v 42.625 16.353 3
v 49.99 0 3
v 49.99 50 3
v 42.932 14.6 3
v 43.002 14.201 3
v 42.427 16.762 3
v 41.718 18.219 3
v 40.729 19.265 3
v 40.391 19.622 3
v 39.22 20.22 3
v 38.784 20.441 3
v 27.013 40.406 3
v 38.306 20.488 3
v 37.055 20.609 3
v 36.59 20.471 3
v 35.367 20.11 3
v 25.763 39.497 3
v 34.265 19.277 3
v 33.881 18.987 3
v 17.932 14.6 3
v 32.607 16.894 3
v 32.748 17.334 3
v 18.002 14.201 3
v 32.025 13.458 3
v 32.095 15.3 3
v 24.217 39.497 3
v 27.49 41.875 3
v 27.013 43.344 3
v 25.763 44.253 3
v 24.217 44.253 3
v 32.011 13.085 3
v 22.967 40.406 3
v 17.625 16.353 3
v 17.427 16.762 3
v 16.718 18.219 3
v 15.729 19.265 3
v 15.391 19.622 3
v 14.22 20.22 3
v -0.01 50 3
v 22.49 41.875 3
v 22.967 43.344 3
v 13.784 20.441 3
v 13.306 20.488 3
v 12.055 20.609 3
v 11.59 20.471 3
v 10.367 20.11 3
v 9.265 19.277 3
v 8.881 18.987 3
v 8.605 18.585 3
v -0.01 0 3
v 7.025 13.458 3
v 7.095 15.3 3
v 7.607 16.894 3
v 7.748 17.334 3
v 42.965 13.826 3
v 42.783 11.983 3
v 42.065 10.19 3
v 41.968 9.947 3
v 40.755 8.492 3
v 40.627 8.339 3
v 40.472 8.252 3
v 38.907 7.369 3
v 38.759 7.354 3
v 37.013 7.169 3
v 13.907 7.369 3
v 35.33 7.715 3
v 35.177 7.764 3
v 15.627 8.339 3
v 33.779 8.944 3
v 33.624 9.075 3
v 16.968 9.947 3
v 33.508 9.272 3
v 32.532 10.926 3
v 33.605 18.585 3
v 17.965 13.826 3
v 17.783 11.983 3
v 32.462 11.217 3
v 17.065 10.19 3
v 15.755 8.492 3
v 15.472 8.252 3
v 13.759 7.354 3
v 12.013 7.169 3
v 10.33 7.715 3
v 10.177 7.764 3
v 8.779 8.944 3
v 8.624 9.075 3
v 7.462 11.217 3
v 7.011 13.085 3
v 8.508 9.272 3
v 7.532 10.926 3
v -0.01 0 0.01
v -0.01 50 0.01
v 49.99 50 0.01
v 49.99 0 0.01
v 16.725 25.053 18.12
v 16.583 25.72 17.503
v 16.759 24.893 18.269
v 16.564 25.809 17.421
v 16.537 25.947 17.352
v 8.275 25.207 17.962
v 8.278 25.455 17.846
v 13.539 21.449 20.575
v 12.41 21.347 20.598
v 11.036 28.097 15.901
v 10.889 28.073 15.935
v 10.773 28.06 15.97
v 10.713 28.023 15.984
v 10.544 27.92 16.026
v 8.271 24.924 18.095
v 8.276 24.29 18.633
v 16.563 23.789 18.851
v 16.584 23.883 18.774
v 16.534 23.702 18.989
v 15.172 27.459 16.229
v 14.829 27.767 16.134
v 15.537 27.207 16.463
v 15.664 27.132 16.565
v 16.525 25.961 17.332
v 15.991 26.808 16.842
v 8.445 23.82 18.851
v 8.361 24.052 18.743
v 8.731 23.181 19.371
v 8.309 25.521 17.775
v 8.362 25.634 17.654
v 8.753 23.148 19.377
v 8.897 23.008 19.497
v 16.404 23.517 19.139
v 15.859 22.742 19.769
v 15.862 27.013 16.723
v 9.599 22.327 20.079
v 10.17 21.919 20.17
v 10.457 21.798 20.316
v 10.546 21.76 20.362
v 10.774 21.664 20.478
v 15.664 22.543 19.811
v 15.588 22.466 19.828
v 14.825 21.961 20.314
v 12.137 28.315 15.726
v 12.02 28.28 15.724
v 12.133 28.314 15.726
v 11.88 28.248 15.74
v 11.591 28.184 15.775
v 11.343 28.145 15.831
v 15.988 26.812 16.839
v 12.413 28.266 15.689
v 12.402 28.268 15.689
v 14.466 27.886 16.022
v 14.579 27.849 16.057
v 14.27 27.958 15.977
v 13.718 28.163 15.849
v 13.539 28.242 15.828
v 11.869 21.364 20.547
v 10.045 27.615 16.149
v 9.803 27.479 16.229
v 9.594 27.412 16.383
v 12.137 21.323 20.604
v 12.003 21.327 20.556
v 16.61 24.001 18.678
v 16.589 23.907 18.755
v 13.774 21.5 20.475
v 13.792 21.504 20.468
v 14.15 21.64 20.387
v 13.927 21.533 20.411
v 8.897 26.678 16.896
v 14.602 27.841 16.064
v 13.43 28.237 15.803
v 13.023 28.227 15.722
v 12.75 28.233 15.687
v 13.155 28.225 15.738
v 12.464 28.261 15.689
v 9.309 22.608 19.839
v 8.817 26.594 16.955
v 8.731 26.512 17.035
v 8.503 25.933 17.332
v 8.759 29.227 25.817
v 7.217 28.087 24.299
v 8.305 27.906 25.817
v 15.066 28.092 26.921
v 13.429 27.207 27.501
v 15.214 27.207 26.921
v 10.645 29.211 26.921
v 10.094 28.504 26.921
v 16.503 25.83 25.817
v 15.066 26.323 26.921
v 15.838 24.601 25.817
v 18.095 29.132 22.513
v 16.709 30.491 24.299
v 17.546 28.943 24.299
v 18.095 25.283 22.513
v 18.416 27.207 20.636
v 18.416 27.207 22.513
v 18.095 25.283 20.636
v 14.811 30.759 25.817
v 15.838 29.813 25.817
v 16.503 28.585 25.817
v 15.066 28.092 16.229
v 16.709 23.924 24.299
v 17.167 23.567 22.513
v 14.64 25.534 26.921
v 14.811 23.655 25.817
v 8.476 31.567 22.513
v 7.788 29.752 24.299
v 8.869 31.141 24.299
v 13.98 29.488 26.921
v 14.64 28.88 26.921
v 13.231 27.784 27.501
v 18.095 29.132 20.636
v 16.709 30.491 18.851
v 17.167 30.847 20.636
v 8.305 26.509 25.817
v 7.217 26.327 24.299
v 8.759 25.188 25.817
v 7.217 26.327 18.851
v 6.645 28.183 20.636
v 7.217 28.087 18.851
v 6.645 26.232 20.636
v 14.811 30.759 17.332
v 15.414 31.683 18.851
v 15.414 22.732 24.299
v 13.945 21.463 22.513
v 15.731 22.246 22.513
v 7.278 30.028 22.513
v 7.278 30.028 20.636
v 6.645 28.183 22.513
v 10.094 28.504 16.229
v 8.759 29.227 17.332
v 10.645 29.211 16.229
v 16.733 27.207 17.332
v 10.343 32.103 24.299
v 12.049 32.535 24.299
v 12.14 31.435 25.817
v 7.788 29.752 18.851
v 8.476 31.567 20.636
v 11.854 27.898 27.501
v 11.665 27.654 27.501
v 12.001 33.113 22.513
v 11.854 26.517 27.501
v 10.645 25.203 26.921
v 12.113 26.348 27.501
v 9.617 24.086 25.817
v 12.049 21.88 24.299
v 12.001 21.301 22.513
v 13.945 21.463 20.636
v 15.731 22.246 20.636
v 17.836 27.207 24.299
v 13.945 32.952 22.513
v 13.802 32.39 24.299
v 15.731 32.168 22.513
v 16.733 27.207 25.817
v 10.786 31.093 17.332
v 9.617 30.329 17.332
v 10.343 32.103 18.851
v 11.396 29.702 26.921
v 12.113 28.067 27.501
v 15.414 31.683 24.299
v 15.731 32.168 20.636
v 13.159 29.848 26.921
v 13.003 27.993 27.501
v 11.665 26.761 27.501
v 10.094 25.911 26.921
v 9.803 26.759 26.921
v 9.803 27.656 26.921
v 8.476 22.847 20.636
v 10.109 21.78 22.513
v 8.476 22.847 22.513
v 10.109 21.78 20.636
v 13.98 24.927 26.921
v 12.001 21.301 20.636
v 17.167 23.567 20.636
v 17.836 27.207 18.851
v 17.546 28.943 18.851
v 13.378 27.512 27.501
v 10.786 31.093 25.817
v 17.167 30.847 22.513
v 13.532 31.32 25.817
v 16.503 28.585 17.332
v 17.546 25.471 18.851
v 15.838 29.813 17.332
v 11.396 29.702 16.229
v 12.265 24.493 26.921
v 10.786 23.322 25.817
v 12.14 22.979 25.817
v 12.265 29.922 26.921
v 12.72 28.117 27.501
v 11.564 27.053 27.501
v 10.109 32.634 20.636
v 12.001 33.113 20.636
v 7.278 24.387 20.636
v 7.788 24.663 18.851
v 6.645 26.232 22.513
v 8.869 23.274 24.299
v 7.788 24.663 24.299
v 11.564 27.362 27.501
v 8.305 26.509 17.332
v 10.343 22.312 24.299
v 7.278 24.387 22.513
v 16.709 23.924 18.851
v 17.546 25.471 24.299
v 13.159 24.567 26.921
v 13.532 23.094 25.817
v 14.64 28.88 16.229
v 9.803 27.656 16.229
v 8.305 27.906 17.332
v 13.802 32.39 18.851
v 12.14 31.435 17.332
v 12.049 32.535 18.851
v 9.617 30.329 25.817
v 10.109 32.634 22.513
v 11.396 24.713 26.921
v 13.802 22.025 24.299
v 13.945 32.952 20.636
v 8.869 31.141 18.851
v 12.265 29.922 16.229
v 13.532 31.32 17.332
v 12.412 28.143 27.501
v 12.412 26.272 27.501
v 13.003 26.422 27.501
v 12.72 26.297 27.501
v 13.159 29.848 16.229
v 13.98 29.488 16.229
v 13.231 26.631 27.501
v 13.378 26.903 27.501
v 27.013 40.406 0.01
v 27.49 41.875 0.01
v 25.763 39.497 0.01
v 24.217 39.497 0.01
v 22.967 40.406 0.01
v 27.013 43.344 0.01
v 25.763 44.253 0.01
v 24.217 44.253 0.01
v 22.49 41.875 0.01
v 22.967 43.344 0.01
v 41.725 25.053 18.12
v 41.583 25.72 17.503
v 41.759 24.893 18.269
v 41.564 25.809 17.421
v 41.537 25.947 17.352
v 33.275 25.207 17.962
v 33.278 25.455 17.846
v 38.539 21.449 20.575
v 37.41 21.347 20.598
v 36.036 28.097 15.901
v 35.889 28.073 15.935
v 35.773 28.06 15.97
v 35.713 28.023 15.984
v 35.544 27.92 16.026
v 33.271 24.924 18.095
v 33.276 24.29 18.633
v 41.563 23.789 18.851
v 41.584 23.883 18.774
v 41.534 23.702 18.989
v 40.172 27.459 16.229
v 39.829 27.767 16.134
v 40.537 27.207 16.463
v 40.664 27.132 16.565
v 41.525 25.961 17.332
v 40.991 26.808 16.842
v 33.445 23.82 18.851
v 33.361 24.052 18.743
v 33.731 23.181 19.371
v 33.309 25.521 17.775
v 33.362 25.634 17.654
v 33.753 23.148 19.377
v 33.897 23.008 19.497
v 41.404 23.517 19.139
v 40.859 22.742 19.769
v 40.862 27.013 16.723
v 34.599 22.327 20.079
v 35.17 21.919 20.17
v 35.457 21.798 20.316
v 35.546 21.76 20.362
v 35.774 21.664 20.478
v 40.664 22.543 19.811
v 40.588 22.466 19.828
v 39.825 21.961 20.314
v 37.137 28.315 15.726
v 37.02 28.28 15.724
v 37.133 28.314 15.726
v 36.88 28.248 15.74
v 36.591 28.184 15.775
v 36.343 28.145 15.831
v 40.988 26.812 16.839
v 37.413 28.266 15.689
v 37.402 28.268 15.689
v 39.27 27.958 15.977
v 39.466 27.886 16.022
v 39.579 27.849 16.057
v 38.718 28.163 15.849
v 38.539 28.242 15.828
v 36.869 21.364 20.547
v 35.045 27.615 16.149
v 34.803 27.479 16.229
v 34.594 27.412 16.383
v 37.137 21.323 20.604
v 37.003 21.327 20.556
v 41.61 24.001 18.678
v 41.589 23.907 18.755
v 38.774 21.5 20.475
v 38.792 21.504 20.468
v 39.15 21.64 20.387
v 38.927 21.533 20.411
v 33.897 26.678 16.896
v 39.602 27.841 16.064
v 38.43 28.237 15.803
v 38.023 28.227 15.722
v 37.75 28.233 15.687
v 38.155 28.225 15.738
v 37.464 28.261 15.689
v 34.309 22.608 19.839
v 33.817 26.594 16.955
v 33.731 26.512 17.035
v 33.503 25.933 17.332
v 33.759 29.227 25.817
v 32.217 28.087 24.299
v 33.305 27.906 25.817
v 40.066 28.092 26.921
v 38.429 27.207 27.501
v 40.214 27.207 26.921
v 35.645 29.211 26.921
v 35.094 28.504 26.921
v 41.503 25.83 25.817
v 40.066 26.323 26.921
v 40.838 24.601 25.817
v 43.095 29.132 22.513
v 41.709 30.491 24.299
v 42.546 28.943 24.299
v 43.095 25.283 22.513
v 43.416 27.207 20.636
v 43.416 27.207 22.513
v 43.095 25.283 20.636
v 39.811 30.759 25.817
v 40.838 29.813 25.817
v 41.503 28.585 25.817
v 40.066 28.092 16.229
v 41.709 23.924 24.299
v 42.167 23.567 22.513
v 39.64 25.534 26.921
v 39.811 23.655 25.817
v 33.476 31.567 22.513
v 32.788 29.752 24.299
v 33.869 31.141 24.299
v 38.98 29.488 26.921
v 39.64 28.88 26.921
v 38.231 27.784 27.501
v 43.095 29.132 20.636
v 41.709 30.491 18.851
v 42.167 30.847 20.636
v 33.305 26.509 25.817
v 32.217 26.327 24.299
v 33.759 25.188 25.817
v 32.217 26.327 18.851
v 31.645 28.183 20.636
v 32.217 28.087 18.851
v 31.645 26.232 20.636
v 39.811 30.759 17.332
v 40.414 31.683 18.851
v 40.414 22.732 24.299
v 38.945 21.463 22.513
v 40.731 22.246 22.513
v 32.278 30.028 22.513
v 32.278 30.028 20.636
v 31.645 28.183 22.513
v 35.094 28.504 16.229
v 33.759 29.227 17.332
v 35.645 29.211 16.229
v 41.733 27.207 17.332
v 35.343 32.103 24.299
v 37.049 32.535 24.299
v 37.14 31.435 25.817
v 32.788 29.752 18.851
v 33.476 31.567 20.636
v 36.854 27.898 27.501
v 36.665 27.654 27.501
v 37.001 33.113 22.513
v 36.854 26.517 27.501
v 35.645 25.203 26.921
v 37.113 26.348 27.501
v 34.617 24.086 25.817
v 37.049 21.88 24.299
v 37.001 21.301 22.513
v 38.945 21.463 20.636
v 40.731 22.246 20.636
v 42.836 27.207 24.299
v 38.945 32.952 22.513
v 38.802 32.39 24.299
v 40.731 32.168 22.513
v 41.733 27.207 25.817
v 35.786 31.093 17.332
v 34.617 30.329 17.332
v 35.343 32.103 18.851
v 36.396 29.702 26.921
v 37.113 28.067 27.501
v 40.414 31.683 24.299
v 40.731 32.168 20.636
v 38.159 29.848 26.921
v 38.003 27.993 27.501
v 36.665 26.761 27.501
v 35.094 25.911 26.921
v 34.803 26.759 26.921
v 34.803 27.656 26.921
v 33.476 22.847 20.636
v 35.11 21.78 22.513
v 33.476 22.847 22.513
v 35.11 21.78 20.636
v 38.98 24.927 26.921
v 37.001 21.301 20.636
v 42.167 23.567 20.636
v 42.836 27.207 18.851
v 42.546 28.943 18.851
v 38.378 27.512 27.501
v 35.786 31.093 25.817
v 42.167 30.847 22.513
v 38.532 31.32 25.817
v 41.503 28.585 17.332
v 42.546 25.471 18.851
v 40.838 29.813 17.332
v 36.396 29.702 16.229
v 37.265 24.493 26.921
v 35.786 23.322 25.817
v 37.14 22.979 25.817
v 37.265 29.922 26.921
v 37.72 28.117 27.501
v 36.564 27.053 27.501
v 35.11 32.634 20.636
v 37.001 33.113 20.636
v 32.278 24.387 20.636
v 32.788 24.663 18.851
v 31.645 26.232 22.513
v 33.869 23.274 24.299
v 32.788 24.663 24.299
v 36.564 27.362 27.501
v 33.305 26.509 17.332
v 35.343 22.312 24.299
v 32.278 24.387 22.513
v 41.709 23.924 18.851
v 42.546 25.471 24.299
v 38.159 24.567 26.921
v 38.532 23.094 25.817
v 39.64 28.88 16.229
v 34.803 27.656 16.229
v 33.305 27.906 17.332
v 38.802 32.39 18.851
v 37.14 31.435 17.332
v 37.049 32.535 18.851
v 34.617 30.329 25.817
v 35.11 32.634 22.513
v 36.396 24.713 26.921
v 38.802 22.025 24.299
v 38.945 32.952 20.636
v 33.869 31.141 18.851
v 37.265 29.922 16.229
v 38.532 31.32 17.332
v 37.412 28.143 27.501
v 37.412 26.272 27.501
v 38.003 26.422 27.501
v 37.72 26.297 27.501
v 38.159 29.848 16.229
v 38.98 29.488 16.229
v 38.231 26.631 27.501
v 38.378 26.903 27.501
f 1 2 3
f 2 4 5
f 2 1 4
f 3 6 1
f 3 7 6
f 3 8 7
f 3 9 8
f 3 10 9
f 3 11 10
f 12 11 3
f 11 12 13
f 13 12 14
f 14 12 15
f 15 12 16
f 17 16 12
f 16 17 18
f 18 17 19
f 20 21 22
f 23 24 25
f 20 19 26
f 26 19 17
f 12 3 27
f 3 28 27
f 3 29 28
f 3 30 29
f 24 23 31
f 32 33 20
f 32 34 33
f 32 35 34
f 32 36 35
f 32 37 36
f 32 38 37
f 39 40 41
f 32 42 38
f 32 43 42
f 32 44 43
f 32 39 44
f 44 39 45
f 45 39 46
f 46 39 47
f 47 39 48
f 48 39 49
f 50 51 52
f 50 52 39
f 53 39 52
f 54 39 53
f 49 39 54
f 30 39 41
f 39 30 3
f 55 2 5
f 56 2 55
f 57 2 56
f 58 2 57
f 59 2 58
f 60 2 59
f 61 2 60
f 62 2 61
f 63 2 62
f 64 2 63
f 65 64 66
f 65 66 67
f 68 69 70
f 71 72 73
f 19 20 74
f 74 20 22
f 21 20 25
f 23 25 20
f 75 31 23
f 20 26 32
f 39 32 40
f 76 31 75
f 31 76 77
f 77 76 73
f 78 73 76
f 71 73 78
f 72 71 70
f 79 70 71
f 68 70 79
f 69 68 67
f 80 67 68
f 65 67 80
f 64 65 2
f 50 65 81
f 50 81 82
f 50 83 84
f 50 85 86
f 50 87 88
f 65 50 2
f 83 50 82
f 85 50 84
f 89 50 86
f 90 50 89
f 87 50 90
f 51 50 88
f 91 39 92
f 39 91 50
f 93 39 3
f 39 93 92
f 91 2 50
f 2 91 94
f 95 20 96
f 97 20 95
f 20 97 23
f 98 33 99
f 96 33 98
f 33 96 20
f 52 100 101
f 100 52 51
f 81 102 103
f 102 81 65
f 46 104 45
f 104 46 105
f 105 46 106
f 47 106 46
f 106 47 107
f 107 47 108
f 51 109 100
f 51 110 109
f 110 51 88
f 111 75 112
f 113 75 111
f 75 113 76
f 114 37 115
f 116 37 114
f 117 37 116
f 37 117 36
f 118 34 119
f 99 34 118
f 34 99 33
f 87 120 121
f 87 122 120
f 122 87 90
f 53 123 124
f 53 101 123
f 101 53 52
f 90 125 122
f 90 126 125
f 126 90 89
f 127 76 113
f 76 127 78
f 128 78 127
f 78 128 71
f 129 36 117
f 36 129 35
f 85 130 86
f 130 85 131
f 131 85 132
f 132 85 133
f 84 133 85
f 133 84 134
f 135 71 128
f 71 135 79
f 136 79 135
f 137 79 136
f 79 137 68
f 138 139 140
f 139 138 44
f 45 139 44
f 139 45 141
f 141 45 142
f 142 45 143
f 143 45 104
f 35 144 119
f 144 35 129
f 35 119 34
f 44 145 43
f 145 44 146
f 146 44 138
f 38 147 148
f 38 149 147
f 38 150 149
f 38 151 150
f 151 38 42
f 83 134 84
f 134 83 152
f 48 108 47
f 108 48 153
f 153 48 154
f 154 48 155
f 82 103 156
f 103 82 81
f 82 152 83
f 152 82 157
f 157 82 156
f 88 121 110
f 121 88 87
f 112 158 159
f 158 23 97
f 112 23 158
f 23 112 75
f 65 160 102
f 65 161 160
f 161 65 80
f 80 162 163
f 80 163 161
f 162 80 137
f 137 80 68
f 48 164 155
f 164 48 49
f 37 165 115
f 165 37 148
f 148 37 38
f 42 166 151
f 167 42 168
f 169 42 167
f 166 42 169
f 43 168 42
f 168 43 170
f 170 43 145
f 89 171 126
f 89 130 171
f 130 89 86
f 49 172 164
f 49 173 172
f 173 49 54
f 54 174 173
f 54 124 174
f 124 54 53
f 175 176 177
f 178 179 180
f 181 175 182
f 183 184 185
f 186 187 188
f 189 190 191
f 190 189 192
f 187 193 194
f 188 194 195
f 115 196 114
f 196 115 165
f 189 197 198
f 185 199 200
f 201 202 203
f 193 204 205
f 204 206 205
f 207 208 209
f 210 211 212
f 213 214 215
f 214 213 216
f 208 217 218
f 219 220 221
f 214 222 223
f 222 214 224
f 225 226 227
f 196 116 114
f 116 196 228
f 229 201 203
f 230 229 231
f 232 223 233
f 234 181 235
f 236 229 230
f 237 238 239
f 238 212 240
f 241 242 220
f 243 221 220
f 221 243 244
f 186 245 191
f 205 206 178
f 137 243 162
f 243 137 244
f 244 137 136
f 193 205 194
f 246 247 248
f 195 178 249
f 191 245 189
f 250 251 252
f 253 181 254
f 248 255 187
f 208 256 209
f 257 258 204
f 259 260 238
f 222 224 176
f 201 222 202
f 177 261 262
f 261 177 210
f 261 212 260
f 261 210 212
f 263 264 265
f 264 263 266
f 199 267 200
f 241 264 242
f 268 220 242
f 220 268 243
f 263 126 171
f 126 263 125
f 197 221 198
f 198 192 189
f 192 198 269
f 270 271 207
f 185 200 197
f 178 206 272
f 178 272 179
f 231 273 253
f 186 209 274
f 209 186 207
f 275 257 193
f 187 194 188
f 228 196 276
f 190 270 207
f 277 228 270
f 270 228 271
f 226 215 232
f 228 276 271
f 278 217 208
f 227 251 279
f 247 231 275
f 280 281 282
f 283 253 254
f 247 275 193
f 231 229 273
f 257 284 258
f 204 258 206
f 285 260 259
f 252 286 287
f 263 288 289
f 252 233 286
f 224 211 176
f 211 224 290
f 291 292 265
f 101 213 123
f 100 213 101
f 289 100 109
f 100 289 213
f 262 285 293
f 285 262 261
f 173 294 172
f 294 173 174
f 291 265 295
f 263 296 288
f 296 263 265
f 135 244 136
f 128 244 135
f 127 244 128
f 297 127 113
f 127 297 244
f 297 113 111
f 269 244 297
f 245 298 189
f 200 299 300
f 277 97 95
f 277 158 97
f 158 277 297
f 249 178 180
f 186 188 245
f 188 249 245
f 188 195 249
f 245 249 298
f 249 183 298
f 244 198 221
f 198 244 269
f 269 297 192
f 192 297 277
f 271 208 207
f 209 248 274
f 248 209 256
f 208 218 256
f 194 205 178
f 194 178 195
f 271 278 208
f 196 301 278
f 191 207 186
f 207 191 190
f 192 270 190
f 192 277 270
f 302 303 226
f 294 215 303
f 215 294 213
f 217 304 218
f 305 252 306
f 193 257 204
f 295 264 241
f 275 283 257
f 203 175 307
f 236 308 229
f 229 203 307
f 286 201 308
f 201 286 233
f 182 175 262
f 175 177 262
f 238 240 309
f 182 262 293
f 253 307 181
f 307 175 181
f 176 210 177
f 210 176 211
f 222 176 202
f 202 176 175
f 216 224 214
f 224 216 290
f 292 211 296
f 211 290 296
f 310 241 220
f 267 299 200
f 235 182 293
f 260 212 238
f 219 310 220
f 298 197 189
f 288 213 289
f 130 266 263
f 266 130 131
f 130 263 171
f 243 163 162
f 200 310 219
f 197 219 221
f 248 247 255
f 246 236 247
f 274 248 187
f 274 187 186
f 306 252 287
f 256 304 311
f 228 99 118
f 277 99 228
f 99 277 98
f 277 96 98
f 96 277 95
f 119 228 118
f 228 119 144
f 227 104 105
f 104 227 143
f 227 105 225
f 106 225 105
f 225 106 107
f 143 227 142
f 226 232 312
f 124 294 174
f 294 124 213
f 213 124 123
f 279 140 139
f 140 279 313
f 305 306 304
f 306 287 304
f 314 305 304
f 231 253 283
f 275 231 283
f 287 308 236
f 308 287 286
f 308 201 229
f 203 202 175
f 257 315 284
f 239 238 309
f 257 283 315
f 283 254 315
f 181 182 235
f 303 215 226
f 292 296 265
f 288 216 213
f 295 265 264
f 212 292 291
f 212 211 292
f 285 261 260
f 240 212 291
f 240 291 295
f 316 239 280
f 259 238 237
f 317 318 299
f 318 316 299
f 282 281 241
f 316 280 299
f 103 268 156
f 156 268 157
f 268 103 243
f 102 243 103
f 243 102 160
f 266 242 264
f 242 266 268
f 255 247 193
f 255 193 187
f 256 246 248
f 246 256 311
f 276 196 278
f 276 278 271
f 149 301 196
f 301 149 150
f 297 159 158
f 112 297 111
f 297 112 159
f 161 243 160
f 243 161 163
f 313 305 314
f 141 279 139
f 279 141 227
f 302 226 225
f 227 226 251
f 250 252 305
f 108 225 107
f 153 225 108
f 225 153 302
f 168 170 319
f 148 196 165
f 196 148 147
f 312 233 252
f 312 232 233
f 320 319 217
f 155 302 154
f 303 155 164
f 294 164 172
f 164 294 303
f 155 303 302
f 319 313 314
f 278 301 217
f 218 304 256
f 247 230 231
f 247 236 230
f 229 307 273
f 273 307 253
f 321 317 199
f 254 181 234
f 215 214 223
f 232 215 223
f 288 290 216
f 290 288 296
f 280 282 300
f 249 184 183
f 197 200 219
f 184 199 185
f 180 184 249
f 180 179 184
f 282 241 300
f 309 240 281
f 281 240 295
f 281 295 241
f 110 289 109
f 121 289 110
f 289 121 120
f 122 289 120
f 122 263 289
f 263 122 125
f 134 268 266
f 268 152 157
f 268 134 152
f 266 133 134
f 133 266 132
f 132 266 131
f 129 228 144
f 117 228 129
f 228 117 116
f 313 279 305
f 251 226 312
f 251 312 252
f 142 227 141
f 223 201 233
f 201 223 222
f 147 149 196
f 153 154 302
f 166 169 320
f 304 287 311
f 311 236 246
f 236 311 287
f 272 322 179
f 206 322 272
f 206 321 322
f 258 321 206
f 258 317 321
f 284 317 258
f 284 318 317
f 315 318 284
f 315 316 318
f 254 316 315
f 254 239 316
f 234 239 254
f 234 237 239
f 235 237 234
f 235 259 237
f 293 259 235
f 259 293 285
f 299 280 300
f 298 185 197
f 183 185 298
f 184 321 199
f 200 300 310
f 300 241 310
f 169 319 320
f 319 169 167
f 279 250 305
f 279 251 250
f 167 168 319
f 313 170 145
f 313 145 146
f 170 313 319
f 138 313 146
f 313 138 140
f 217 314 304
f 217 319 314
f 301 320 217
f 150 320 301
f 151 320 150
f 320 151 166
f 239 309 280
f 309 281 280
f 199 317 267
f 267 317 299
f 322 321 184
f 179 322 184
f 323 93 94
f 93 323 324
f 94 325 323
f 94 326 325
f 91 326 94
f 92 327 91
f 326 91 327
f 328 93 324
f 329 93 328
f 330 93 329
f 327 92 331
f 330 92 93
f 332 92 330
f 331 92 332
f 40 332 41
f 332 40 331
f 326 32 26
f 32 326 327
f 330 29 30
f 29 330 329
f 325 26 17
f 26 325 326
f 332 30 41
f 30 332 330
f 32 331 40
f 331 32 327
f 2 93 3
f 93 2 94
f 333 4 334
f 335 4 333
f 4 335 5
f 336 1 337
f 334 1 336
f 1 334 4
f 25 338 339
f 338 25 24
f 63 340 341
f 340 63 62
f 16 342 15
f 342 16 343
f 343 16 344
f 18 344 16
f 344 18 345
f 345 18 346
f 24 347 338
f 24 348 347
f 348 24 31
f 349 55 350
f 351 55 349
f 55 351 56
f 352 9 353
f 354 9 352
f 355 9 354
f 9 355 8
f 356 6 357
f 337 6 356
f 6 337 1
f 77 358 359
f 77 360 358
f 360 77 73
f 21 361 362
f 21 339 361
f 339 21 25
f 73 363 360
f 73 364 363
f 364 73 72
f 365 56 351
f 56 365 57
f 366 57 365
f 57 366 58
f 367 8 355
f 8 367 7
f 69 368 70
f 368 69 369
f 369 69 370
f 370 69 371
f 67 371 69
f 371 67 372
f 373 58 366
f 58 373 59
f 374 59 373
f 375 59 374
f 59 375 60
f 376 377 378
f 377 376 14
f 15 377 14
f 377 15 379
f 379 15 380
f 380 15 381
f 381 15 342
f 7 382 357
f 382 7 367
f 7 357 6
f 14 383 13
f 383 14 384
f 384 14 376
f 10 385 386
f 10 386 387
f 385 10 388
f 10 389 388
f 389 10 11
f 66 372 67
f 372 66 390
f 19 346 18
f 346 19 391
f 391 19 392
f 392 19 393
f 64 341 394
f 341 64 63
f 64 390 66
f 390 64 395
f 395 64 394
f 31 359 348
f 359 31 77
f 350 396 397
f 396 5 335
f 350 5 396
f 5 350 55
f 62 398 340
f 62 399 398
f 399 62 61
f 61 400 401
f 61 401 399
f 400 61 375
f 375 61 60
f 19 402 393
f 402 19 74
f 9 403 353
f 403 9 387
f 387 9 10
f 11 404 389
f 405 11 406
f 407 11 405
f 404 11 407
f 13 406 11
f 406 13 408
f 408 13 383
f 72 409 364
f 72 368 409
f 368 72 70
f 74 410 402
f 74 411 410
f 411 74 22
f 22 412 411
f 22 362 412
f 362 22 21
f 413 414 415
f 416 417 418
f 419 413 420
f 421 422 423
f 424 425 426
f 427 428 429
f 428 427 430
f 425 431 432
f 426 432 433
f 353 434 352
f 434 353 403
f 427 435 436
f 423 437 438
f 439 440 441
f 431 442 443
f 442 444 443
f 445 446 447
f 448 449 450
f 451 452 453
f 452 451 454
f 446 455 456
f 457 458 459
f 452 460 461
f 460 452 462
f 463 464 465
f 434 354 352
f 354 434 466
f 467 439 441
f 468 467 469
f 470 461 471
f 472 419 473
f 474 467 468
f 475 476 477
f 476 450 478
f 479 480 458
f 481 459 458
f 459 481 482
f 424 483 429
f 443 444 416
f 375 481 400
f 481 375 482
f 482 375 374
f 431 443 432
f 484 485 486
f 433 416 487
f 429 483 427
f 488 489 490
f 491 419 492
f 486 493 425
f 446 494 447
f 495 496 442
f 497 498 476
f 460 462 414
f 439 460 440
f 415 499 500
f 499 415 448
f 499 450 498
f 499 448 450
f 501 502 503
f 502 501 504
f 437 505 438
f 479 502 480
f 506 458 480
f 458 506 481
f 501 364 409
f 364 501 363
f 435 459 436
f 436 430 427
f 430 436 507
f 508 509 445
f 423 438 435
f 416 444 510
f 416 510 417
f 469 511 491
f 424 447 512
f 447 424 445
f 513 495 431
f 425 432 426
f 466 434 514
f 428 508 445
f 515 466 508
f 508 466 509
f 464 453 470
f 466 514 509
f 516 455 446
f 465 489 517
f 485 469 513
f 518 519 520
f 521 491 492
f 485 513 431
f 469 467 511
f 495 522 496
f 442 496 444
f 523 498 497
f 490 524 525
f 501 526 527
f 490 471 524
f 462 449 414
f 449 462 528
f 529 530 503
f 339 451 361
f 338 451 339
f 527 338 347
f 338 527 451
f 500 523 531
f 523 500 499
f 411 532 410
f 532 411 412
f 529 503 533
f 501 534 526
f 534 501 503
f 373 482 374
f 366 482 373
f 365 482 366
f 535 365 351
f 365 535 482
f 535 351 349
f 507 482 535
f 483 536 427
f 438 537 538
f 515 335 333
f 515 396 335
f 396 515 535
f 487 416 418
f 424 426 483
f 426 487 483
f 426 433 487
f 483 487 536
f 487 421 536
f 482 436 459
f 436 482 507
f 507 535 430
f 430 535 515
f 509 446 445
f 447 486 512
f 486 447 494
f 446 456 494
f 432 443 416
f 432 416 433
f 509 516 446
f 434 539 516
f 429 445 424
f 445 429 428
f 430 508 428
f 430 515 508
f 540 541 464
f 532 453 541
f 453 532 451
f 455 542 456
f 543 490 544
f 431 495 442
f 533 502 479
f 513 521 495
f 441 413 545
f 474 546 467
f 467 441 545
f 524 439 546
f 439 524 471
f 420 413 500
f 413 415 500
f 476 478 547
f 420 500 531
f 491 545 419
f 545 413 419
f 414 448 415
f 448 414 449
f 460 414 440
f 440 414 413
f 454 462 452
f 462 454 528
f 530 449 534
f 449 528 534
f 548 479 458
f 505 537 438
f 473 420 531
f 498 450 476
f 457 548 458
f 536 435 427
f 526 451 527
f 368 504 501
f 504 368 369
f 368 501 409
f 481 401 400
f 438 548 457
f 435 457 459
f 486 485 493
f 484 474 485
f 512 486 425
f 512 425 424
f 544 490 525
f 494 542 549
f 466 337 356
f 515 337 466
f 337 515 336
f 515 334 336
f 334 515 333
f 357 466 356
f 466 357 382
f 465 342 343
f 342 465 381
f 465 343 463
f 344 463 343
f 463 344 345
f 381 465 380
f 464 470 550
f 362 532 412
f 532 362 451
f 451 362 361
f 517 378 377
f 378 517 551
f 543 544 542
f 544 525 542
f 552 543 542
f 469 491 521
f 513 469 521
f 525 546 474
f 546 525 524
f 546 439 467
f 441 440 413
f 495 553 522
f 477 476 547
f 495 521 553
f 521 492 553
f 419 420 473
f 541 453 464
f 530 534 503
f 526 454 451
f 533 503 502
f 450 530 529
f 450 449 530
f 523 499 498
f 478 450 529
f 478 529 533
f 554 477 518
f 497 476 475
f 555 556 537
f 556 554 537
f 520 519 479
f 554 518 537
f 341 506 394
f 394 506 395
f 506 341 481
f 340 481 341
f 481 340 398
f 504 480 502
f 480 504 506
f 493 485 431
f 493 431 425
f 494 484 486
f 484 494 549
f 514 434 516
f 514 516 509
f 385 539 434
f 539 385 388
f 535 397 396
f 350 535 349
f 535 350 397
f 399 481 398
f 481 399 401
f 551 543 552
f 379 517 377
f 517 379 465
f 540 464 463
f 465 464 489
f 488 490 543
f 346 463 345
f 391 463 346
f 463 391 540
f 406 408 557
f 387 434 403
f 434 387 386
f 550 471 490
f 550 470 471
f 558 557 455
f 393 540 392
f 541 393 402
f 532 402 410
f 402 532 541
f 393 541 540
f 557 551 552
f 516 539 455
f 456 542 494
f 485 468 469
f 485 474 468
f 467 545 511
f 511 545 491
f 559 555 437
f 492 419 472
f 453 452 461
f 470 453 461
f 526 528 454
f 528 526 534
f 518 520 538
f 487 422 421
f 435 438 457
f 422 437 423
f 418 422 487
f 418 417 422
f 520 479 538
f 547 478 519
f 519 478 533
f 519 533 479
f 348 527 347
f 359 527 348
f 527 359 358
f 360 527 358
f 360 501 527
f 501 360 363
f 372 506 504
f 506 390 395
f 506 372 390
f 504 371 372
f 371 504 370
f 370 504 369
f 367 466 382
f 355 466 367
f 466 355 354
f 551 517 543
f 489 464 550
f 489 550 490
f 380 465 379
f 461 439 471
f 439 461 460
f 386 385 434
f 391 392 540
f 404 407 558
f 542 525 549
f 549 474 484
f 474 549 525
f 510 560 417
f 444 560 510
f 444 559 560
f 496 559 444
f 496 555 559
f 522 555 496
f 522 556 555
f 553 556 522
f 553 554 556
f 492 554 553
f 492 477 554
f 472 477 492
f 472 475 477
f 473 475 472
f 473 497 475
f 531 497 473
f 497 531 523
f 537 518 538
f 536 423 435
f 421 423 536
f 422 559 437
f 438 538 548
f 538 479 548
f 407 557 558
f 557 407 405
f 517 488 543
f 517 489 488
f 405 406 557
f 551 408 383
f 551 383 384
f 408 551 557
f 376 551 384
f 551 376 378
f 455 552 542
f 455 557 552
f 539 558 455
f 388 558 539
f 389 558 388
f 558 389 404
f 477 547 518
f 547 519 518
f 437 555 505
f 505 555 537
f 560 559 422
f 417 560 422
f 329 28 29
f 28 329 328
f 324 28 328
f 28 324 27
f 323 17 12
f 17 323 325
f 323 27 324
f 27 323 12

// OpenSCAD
/*-------------------------------*\
|  YACH Yet Another Coat Hanger   |
| Parametrized for the Customizer |
| Creative Commons-Share alike    |
|  User Msquare on Thingverse     |
\*-------------------------------*/

// Based on my first simple "Yet Another Coat Hanger" Thing:593330

// Number of hooks
NOH = 2; //[1:7]

// Base Plate Height
BPH = 50 ; //[20:100]

// Base Plate Width
BPW = 25 ; //[20:60]

// Base Plate Thickness
BPT = 3 ; //[1:10]

// Screw Hole Diameter ( < BPW )
SHD = 2.5 ; //[2:20]

// Stem Length
SLN = 30 ; //[20:60]

// Stem Diameter Bottom 
SDB = 6 ; //[3:10]

// Stem Diameter Top 
SDT = 4 ; //[3:20]

// Size of tip ( > SDT*1.3 may require support material )
SOT = 6 ; //[3:20]

// Angle of Stem ( < 45 may require support material )
AOS = 55 ; //[10:85]

for (N=[1:NOH]) {
  translate([(N-1)*BPW-0.01,0,0]) 
  difference() {
    union() {
      // The Base plate
      cube([BPW, BPH, BPT]) ; 

      // The cylinder/cone, at an angle.
      translate([BPW/2, 10, -3]) rotate([AOS-90, 0, 0]) 
        cylinder(r1=SDB, r2= SDT, h=SLN) ;

     // The Sphere tip 
      translate([BPW/2, 10+SLN*cos(AOS), -3+SLN*sin(AOS)])
        sphere(r=SOT) ;
    }

    // Clean off bottom protrusions
    translate([0,0,-9.99])
      cube([BPW, BPH, 10]) ;

    // The screw hole
// 1 (BPW/2,BPW/2)
// 2 (-,BPW)(0,-)
// 3 (-,BPW)(0,BPW)(0,-)
      translate([(N>1)?0:(NOH==1)?BPW/2:BPW, BPH-SHD-(BPW-SHD)/4, -1])
        cylinder(r=SHD, h=BPT+2, $fn=10) ;
      translate([(N<NOH)?BPW:((NOH==1)?BPW/2:0), BPH-SHD-(BPW-SHD)/4, -1])
        cylinder(r=SHD, h=BPT+2, $fn=10) ;

  }
}
